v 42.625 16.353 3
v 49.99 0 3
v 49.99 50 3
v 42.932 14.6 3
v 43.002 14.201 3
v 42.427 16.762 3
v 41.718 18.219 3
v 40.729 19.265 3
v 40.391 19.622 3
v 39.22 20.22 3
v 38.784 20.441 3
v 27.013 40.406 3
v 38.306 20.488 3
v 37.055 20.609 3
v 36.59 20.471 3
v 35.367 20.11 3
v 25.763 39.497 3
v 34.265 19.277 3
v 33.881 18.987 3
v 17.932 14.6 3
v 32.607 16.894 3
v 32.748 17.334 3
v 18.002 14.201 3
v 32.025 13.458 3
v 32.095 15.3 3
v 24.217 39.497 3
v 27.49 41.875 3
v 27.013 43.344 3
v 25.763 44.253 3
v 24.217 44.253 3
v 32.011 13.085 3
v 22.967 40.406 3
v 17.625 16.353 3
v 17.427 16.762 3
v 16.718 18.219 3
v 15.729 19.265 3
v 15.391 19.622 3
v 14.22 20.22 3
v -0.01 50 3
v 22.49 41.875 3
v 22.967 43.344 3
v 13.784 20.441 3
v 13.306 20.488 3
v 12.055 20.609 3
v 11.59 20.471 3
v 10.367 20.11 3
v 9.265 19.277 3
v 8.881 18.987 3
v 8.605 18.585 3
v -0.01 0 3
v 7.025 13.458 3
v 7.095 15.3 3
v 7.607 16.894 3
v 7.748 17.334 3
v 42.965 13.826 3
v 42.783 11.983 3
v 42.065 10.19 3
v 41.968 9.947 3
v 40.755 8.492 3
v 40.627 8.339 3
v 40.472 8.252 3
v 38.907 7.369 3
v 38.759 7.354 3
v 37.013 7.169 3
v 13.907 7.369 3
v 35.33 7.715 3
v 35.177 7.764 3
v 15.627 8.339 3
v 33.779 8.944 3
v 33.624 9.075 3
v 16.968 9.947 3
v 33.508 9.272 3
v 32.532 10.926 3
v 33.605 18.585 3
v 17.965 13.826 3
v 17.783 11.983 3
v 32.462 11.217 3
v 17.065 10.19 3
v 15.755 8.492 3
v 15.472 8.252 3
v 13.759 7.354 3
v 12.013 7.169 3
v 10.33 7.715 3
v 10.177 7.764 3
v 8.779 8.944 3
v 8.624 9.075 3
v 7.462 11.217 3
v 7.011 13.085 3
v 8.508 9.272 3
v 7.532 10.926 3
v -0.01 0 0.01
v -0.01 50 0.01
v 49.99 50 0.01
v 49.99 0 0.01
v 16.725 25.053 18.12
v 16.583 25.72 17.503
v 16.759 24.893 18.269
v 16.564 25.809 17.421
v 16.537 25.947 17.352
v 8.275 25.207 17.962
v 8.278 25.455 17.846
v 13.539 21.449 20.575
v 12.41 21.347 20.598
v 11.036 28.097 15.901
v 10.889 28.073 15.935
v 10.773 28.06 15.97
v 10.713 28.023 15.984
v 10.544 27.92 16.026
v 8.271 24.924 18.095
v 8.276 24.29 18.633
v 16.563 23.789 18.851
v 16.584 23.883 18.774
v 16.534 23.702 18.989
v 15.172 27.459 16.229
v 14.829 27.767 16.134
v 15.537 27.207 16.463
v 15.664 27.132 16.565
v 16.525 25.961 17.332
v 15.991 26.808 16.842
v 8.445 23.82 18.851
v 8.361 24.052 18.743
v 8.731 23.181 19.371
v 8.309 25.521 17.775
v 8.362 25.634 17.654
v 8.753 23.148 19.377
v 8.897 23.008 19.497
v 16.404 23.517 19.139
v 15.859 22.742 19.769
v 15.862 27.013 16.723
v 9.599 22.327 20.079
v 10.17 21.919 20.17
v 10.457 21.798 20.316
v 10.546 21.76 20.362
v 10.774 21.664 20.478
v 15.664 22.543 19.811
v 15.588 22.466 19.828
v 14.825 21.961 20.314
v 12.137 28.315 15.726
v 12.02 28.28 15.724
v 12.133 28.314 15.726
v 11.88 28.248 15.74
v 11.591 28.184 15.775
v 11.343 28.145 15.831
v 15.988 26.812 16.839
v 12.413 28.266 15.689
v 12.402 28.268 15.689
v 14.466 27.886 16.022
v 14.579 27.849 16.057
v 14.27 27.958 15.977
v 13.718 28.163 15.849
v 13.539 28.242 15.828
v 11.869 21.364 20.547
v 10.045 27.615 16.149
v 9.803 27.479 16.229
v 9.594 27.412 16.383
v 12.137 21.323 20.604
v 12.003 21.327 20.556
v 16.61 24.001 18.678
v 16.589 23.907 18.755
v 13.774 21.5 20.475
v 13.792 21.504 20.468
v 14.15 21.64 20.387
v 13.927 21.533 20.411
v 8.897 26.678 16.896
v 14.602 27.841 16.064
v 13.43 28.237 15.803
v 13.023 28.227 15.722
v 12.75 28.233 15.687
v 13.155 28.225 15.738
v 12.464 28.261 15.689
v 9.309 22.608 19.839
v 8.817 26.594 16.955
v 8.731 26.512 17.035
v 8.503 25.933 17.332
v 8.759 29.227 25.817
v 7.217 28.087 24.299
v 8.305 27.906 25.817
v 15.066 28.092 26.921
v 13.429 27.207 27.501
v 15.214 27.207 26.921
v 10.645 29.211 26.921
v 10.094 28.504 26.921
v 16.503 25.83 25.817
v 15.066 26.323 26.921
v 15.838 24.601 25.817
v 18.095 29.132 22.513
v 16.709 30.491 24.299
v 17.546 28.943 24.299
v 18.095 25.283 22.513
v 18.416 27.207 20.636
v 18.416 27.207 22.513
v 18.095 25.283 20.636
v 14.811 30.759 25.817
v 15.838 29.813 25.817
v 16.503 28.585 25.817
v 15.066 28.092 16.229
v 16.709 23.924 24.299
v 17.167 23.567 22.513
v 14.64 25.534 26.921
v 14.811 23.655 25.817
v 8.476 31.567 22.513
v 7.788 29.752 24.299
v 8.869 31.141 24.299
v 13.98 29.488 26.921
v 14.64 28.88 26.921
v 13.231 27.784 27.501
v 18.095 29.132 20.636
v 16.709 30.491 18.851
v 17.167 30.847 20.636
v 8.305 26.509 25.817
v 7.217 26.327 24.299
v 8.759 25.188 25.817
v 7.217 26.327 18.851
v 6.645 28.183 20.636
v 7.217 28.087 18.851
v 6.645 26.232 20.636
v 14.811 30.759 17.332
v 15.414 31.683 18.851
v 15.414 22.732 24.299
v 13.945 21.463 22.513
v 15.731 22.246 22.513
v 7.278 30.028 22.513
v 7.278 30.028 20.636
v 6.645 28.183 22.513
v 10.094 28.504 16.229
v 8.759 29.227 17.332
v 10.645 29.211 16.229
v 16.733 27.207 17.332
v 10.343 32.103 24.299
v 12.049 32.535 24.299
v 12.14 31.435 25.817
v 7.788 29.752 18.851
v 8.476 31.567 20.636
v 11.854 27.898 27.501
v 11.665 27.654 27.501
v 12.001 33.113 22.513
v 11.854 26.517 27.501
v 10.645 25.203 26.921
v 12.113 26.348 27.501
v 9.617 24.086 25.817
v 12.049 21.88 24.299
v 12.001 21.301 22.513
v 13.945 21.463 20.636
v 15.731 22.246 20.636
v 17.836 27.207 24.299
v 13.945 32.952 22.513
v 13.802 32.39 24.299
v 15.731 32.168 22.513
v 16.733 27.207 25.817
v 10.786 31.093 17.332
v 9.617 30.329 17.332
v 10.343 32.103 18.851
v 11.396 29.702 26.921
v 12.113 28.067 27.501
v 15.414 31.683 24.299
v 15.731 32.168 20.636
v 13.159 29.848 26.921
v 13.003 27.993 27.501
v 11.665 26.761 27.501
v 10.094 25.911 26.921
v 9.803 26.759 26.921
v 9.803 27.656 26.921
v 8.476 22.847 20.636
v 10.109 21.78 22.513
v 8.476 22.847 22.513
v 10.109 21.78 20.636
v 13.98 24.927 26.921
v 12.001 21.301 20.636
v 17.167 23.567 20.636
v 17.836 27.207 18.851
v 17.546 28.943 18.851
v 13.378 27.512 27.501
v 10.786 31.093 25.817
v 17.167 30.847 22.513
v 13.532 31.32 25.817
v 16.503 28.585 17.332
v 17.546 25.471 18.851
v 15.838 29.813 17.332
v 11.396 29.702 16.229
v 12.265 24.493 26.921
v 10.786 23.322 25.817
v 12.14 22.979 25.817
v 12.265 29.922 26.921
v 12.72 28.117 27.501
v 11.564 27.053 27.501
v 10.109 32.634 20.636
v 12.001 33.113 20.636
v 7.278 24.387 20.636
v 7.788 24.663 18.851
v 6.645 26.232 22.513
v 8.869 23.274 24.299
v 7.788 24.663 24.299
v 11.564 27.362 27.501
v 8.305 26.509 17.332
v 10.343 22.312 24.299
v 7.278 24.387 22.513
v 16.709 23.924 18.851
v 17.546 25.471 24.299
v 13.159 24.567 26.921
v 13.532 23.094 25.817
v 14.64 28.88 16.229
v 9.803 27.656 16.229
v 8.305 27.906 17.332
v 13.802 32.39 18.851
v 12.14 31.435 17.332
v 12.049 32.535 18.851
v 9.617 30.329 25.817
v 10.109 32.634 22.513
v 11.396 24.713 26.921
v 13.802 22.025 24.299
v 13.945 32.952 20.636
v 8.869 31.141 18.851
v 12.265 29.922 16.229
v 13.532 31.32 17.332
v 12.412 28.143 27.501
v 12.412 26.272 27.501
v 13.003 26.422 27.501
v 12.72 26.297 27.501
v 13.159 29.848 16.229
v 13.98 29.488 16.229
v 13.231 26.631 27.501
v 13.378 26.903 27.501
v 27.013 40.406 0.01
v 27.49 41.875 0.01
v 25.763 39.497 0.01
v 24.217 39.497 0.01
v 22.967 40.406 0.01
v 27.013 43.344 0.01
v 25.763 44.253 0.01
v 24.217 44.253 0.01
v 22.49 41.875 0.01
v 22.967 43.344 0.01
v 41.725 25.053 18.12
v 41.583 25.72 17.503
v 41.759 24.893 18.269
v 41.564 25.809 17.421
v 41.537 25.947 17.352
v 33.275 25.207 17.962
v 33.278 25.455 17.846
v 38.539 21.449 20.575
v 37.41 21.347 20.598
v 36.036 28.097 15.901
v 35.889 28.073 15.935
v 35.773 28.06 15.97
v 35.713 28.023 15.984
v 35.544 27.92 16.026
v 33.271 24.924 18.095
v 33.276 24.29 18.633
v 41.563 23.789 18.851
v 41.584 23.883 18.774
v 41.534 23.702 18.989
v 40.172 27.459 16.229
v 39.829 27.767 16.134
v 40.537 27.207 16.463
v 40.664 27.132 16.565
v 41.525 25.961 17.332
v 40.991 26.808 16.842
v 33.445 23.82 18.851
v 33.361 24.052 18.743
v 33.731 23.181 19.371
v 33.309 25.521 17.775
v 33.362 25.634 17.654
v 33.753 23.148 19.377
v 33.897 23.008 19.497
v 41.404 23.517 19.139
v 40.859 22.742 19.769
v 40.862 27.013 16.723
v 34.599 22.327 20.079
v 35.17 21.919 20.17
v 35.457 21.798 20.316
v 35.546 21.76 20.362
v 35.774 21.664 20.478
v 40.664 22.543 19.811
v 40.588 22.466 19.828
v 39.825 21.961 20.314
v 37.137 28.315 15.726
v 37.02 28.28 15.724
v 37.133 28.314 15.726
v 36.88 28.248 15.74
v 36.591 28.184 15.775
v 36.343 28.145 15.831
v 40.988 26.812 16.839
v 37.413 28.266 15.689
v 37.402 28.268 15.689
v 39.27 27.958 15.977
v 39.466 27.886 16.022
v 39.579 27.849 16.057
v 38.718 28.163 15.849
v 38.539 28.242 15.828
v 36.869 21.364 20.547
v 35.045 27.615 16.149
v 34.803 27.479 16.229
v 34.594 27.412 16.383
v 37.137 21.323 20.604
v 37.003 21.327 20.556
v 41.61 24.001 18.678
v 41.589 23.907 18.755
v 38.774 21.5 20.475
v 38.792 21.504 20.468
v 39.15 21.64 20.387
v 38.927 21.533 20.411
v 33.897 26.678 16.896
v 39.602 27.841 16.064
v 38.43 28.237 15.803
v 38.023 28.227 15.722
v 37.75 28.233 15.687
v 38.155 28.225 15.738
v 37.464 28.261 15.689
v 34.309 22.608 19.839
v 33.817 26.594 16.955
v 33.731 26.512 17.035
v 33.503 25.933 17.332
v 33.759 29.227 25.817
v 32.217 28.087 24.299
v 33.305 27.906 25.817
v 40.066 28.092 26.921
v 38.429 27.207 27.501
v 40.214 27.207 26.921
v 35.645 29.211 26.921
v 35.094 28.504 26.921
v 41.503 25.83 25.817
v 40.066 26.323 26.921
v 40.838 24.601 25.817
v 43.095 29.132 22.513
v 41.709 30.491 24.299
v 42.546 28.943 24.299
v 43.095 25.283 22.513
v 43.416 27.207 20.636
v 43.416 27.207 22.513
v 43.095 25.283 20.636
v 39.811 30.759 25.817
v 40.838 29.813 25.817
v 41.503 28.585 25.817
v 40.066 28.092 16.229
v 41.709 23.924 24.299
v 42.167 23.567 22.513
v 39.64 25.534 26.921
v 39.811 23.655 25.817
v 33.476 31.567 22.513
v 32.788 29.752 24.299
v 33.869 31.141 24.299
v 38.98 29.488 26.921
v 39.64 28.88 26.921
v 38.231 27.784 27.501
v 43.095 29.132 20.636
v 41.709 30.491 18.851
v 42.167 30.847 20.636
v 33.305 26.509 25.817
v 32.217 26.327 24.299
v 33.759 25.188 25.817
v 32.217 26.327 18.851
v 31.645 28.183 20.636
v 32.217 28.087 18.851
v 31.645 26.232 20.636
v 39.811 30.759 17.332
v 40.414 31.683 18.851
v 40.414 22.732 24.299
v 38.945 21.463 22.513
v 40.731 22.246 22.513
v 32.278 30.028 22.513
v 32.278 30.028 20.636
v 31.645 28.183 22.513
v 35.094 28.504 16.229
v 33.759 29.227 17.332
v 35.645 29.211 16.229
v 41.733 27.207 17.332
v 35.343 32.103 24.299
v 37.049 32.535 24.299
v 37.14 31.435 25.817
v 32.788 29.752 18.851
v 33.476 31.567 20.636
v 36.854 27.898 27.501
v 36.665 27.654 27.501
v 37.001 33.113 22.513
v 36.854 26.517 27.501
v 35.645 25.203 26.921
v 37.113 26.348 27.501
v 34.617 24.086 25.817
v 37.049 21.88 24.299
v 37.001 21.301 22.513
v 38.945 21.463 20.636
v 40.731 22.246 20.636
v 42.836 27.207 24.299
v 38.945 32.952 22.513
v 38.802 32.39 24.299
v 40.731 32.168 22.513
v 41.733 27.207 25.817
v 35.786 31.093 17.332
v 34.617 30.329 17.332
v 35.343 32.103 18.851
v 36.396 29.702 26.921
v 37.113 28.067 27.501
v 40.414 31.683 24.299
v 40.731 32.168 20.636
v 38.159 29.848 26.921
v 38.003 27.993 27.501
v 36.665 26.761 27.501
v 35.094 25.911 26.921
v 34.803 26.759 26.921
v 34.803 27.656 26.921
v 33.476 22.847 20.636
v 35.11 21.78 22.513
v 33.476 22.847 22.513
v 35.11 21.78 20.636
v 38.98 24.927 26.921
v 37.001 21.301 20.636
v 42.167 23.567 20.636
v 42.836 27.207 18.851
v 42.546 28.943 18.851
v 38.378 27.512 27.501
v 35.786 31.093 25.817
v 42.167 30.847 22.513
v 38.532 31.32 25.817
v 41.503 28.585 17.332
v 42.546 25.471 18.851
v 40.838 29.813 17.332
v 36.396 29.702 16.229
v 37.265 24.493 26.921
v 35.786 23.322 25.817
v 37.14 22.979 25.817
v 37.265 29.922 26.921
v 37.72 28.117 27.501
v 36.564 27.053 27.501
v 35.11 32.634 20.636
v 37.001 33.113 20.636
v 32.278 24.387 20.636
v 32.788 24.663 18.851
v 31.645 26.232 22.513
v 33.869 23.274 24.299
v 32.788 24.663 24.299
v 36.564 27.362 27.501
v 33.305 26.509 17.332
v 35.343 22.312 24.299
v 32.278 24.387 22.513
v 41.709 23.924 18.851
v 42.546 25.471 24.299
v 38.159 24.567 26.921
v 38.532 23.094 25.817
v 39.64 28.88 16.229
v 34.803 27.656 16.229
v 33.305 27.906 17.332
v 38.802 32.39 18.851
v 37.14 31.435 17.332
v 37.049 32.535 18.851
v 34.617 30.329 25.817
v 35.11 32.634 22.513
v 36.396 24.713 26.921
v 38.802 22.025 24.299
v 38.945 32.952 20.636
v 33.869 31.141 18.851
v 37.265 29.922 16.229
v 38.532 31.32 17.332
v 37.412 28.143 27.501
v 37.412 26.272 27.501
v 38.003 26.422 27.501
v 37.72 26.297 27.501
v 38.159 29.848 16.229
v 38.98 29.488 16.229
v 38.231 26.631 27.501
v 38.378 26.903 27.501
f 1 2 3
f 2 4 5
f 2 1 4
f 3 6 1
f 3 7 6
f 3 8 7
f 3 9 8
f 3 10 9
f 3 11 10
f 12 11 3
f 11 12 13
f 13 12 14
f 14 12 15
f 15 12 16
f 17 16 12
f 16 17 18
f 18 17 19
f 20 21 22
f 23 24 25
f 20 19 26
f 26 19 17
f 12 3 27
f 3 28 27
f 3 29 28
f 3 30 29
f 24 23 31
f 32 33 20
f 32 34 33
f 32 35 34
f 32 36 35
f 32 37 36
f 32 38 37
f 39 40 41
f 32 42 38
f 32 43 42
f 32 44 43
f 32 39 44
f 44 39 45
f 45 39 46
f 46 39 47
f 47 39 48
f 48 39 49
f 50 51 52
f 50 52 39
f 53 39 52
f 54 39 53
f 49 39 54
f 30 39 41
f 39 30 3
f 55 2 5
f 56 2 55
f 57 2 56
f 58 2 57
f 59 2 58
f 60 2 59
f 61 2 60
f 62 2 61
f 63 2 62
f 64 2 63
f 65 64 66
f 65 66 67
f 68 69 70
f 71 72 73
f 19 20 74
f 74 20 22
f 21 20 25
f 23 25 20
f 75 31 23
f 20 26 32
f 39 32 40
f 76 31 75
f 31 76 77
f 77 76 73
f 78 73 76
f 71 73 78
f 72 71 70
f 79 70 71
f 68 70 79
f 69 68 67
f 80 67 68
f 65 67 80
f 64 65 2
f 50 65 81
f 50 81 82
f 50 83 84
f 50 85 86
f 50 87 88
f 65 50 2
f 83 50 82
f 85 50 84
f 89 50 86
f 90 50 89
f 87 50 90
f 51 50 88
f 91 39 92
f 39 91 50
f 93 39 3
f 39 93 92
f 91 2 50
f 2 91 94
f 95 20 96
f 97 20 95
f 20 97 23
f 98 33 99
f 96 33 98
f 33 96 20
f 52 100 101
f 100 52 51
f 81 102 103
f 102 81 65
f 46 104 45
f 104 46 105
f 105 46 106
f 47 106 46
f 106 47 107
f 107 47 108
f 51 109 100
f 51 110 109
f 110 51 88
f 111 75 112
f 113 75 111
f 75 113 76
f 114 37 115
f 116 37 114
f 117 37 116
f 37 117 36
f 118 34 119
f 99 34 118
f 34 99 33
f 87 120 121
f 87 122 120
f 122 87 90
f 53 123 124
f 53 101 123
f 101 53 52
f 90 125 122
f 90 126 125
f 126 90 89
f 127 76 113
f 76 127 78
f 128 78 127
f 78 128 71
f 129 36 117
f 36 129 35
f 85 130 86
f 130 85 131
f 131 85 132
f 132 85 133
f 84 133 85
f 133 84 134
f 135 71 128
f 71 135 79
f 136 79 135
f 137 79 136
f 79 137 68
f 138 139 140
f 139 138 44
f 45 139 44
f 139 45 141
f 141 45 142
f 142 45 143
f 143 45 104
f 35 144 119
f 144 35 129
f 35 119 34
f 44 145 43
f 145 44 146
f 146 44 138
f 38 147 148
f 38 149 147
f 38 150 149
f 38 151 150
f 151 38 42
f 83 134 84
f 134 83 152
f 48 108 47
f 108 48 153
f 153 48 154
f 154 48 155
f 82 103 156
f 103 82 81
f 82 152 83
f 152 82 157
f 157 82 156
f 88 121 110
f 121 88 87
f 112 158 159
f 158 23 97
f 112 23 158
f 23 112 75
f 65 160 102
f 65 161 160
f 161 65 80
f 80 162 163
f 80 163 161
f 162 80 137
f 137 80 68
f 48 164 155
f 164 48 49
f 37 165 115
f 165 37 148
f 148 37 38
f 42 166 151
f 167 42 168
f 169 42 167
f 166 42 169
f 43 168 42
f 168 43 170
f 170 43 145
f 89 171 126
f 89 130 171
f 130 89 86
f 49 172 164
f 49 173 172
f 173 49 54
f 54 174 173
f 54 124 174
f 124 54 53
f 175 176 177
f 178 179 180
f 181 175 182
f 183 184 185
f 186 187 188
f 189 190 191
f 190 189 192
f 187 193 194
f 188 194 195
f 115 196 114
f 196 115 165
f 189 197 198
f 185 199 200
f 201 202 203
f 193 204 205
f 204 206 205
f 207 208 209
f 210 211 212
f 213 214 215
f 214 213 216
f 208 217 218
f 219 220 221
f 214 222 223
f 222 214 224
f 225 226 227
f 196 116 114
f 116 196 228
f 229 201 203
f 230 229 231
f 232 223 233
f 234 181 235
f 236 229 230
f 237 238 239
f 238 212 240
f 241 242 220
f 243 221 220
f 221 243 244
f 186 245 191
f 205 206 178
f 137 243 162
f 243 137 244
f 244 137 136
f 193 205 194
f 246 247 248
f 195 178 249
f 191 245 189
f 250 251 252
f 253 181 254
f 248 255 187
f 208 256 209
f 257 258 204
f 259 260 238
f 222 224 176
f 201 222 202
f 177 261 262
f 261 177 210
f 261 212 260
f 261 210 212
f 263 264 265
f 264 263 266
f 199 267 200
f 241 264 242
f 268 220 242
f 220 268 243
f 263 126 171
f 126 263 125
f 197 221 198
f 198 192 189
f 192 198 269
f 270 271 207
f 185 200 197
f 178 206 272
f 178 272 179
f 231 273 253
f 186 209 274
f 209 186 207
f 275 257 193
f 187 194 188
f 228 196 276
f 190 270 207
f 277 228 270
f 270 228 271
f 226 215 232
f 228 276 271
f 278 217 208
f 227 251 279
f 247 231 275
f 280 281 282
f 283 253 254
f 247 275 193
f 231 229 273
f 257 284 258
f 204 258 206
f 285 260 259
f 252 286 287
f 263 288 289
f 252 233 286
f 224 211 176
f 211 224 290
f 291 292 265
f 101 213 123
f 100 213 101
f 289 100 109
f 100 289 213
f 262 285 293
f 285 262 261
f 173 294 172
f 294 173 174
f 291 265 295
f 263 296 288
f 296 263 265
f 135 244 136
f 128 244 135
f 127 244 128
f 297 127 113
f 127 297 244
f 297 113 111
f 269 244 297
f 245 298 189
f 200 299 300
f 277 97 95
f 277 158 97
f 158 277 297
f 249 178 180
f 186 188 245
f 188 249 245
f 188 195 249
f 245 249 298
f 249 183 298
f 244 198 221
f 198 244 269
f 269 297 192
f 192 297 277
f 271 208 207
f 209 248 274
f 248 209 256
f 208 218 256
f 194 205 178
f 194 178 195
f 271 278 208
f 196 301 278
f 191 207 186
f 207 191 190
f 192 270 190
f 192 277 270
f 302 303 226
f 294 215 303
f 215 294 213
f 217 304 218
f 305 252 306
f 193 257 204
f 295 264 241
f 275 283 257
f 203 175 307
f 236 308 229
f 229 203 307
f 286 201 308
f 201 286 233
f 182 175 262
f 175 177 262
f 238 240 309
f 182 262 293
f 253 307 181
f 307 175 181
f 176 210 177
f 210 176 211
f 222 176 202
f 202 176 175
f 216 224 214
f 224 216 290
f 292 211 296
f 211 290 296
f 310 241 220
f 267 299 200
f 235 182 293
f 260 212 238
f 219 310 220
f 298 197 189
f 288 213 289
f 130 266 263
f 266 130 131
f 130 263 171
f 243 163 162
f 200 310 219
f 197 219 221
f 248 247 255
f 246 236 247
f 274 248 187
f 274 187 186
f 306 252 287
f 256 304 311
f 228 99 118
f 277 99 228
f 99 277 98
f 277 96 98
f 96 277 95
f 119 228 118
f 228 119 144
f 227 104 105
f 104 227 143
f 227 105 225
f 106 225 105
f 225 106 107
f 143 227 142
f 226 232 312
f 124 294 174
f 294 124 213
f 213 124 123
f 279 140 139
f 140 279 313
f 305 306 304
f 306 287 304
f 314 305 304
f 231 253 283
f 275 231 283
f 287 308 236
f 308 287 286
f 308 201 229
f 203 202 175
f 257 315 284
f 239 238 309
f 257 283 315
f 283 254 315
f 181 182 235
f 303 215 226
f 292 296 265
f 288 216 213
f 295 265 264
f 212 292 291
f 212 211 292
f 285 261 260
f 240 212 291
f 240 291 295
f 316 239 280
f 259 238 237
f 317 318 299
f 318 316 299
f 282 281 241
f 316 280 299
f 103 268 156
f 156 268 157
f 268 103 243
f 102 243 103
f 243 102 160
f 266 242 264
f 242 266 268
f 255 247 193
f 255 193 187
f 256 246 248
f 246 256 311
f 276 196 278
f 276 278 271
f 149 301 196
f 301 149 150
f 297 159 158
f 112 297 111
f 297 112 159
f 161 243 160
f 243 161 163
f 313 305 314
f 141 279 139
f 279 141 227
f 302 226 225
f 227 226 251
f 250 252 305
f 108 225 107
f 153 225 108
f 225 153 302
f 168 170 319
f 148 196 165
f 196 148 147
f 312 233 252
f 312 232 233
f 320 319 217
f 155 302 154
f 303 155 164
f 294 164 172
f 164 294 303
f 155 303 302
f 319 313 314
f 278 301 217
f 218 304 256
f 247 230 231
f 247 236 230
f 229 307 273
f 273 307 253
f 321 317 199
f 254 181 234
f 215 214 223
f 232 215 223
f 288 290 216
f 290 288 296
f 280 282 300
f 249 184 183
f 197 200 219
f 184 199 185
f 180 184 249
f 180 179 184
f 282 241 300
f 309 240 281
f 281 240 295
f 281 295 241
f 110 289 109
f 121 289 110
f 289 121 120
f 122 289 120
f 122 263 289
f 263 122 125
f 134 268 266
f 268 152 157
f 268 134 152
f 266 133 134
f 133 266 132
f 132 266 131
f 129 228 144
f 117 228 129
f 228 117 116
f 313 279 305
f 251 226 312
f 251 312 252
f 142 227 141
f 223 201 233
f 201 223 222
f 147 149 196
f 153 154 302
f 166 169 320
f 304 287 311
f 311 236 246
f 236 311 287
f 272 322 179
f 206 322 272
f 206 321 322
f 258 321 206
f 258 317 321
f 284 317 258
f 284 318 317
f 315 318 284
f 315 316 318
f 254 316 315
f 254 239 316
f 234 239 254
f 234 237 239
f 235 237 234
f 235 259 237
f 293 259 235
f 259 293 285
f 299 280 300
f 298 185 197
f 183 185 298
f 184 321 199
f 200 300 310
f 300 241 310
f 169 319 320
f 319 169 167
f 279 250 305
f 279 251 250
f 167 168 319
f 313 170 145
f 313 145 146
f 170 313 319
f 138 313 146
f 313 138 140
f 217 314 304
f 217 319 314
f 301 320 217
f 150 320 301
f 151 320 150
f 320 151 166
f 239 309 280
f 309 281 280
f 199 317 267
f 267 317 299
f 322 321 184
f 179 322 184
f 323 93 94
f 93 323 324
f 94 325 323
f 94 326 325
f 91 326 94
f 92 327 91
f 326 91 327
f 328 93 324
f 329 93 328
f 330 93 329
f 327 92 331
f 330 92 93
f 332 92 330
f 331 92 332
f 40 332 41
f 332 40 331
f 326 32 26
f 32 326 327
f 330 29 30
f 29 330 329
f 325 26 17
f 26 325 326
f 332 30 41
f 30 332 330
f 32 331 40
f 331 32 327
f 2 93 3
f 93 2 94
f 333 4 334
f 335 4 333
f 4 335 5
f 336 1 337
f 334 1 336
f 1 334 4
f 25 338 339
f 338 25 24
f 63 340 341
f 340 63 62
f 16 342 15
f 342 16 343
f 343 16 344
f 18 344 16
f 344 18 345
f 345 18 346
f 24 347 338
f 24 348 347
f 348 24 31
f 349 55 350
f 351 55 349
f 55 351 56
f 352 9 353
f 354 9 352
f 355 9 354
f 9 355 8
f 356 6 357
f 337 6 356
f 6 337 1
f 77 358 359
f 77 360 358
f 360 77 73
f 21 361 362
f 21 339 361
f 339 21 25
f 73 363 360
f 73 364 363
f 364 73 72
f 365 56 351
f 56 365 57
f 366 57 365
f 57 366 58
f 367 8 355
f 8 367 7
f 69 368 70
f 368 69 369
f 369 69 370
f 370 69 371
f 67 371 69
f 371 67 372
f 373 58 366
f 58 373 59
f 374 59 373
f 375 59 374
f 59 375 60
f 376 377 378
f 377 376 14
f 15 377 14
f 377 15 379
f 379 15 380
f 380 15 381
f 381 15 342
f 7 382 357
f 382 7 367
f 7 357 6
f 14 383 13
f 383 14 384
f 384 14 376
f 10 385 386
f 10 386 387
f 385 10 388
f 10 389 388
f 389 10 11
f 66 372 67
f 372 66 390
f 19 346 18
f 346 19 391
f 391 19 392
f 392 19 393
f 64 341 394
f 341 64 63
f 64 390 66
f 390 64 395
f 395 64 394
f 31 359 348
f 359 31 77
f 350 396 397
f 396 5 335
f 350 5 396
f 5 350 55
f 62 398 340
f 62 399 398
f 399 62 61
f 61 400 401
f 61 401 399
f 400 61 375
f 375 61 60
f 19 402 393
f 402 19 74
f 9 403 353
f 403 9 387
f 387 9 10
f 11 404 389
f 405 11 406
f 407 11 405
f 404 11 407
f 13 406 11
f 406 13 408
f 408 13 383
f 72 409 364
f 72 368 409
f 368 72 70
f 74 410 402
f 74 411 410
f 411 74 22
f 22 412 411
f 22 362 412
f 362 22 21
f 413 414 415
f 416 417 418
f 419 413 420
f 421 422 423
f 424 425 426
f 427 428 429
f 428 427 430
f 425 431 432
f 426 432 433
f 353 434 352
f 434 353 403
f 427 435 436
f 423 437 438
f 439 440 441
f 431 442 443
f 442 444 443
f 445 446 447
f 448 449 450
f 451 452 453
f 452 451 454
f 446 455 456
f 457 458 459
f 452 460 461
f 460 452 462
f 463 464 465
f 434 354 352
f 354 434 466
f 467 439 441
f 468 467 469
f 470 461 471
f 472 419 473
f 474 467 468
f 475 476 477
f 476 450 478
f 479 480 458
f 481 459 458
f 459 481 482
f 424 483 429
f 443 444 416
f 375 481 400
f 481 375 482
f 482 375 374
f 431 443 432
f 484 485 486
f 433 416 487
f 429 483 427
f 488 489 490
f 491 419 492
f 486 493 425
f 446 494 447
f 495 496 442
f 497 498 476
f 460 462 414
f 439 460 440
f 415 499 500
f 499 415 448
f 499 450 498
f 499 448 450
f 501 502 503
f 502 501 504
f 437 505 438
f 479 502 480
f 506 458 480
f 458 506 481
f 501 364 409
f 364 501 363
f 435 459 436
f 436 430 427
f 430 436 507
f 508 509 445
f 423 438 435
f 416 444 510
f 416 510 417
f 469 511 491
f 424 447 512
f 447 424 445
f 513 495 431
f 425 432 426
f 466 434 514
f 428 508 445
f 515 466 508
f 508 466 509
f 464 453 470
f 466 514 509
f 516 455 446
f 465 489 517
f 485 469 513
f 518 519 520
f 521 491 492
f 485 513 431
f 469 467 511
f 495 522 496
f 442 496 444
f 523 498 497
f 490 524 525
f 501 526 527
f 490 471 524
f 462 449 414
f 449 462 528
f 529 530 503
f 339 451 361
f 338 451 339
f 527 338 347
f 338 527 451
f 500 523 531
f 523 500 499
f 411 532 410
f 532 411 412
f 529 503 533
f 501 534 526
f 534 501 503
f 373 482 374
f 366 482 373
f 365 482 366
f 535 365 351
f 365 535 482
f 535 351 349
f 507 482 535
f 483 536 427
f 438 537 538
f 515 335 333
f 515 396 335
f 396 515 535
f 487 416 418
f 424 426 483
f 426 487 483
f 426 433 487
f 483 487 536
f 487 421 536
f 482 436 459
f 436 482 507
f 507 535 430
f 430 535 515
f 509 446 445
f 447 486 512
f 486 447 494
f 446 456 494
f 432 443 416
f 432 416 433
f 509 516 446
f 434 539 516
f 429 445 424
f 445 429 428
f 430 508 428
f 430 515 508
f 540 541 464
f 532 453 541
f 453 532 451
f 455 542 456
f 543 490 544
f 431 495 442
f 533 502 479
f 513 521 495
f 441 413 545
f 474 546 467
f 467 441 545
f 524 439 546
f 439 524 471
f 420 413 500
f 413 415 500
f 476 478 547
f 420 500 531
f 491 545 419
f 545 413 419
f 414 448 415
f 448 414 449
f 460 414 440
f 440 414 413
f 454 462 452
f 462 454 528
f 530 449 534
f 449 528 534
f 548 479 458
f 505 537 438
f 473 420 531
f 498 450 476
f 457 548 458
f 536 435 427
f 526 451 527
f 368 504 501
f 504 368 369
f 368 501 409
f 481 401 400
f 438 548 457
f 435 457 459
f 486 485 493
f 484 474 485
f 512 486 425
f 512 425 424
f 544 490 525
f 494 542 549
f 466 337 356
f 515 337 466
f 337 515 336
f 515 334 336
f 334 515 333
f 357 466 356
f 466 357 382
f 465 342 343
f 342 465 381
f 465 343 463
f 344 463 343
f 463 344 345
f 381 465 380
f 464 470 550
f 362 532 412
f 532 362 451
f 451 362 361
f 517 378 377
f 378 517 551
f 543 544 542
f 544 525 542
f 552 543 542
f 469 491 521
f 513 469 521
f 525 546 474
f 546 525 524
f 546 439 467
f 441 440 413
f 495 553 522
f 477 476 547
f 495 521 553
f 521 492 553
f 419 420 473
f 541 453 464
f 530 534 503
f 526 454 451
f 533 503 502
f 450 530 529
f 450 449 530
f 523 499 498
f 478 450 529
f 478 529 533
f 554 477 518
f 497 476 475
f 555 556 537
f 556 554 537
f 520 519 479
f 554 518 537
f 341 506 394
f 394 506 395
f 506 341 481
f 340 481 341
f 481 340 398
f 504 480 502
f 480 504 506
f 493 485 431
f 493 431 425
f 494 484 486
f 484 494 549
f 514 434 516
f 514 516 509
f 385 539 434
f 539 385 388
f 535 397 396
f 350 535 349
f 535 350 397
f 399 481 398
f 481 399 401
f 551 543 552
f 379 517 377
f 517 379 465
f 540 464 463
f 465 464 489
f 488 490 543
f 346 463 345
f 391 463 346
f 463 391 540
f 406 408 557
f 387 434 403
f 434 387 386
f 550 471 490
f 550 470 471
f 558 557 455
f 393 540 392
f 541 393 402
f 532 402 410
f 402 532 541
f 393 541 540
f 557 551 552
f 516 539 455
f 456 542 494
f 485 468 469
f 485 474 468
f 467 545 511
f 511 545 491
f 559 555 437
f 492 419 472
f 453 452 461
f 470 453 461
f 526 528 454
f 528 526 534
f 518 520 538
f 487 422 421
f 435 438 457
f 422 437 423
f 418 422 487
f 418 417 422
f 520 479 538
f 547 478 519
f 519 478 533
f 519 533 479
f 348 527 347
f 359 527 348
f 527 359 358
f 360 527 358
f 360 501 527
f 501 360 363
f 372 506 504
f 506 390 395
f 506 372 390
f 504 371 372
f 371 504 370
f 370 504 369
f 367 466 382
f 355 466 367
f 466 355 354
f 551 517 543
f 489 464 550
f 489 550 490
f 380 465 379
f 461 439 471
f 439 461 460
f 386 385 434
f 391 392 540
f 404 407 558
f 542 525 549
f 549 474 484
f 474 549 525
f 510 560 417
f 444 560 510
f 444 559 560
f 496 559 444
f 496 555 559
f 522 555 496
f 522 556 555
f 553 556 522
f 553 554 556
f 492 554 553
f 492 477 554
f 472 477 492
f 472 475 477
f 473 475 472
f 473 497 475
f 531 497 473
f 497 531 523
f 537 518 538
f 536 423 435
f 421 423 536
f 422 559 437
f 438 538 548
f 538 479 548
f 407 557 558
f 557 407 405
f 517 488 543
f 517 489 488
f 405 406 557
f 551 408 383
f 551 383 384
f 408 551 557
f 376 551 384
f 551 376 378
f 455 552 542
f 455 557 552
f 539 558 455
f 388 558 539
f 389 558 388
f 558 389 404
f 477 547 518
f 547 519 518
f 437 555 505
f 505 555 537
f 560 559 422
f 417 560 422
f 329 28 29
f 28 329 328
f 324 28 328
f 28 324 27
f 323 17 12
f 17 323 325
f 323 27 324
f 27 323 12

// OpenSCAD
/*-------------------------------*\
|  YACH Yet Another Coat Hanger   |
| Parametrized for the Customizer |
| Creative Commons-Share alike    |
|  User Msquare on Thingverse     |
\*-------------------------------*/

// Based on my first simple "Yet Another Coat Hanger" Thing:593330

// Number of hooks
NOH = 2; //[1:7]

// Base Plate Height
BPH = 50 ; //[20:100]

// Base Plate Width
BPW = 25 ; //[20:60]

// Base Plate Thickness
BPT = 3 ; //[1:10]

// Screw Hole Diameter ( < BPW )
SHD = 2.5 ; //[2:20]

// Stem Length
SLN = 30 ; //[20:60]

// Stem Diameter Bottom 
SDB = 6 ; //[3:10]

// Stem Diameter Top 
SDT = 4 ; //[3:20]

// Size of tip ( > SDT*1.3 may require support material )
SOT = 6 ; //[3:20]

// Angle of Stem ( < 45 may require support material )
AOS = 55 ; //[10:85]

for (N=[1:NOH]) {
  translate([(N-1)*BPW-0.01,0,0]) 
  difference() {
    union() {
      // The Base plate
      cube([BPW, BPH, BPT]) ; 

      // The cylinder/cone, at an angle.
      translate([BPW/2, 10, -3]) rotate([AOS-90, 0, 0]) 
        cylinder(r1=SDB, r2= SDT, h=SLN) ;

     // The Sphere tip 
      translate([BPW/2, 10+SLN*cos(AOS), -3+SLN*sin(AOS)])
        sphere(r=SOT) ;
    }

    // Clean off bottom protrusions
    translate([0,0,-9.99])
      cube([BPW, BPH, 10]) ;

    // The screw hole
// 1 (BPW/2,BPW/2)
// 2 (-,BPW)(0,-)
// 3 (-,BPW)(0,BPW)(0,-)
      translate([(N>1)?0:(NOH==1)?BPW/2:BPW, BPH-SHD-(BPW-SHD)/4, -1])
        cylinder(r=SHD, h=BPT+2, $fn=10) ;
      translate([(N<NOH)?BPW:((NOH==1)?BPW/2:0), BPH-SHD-(BPW-SHD)/4, -1])
        cylinder(r=SHD, h=BPT+2, $fn=10) ;

  }
}
